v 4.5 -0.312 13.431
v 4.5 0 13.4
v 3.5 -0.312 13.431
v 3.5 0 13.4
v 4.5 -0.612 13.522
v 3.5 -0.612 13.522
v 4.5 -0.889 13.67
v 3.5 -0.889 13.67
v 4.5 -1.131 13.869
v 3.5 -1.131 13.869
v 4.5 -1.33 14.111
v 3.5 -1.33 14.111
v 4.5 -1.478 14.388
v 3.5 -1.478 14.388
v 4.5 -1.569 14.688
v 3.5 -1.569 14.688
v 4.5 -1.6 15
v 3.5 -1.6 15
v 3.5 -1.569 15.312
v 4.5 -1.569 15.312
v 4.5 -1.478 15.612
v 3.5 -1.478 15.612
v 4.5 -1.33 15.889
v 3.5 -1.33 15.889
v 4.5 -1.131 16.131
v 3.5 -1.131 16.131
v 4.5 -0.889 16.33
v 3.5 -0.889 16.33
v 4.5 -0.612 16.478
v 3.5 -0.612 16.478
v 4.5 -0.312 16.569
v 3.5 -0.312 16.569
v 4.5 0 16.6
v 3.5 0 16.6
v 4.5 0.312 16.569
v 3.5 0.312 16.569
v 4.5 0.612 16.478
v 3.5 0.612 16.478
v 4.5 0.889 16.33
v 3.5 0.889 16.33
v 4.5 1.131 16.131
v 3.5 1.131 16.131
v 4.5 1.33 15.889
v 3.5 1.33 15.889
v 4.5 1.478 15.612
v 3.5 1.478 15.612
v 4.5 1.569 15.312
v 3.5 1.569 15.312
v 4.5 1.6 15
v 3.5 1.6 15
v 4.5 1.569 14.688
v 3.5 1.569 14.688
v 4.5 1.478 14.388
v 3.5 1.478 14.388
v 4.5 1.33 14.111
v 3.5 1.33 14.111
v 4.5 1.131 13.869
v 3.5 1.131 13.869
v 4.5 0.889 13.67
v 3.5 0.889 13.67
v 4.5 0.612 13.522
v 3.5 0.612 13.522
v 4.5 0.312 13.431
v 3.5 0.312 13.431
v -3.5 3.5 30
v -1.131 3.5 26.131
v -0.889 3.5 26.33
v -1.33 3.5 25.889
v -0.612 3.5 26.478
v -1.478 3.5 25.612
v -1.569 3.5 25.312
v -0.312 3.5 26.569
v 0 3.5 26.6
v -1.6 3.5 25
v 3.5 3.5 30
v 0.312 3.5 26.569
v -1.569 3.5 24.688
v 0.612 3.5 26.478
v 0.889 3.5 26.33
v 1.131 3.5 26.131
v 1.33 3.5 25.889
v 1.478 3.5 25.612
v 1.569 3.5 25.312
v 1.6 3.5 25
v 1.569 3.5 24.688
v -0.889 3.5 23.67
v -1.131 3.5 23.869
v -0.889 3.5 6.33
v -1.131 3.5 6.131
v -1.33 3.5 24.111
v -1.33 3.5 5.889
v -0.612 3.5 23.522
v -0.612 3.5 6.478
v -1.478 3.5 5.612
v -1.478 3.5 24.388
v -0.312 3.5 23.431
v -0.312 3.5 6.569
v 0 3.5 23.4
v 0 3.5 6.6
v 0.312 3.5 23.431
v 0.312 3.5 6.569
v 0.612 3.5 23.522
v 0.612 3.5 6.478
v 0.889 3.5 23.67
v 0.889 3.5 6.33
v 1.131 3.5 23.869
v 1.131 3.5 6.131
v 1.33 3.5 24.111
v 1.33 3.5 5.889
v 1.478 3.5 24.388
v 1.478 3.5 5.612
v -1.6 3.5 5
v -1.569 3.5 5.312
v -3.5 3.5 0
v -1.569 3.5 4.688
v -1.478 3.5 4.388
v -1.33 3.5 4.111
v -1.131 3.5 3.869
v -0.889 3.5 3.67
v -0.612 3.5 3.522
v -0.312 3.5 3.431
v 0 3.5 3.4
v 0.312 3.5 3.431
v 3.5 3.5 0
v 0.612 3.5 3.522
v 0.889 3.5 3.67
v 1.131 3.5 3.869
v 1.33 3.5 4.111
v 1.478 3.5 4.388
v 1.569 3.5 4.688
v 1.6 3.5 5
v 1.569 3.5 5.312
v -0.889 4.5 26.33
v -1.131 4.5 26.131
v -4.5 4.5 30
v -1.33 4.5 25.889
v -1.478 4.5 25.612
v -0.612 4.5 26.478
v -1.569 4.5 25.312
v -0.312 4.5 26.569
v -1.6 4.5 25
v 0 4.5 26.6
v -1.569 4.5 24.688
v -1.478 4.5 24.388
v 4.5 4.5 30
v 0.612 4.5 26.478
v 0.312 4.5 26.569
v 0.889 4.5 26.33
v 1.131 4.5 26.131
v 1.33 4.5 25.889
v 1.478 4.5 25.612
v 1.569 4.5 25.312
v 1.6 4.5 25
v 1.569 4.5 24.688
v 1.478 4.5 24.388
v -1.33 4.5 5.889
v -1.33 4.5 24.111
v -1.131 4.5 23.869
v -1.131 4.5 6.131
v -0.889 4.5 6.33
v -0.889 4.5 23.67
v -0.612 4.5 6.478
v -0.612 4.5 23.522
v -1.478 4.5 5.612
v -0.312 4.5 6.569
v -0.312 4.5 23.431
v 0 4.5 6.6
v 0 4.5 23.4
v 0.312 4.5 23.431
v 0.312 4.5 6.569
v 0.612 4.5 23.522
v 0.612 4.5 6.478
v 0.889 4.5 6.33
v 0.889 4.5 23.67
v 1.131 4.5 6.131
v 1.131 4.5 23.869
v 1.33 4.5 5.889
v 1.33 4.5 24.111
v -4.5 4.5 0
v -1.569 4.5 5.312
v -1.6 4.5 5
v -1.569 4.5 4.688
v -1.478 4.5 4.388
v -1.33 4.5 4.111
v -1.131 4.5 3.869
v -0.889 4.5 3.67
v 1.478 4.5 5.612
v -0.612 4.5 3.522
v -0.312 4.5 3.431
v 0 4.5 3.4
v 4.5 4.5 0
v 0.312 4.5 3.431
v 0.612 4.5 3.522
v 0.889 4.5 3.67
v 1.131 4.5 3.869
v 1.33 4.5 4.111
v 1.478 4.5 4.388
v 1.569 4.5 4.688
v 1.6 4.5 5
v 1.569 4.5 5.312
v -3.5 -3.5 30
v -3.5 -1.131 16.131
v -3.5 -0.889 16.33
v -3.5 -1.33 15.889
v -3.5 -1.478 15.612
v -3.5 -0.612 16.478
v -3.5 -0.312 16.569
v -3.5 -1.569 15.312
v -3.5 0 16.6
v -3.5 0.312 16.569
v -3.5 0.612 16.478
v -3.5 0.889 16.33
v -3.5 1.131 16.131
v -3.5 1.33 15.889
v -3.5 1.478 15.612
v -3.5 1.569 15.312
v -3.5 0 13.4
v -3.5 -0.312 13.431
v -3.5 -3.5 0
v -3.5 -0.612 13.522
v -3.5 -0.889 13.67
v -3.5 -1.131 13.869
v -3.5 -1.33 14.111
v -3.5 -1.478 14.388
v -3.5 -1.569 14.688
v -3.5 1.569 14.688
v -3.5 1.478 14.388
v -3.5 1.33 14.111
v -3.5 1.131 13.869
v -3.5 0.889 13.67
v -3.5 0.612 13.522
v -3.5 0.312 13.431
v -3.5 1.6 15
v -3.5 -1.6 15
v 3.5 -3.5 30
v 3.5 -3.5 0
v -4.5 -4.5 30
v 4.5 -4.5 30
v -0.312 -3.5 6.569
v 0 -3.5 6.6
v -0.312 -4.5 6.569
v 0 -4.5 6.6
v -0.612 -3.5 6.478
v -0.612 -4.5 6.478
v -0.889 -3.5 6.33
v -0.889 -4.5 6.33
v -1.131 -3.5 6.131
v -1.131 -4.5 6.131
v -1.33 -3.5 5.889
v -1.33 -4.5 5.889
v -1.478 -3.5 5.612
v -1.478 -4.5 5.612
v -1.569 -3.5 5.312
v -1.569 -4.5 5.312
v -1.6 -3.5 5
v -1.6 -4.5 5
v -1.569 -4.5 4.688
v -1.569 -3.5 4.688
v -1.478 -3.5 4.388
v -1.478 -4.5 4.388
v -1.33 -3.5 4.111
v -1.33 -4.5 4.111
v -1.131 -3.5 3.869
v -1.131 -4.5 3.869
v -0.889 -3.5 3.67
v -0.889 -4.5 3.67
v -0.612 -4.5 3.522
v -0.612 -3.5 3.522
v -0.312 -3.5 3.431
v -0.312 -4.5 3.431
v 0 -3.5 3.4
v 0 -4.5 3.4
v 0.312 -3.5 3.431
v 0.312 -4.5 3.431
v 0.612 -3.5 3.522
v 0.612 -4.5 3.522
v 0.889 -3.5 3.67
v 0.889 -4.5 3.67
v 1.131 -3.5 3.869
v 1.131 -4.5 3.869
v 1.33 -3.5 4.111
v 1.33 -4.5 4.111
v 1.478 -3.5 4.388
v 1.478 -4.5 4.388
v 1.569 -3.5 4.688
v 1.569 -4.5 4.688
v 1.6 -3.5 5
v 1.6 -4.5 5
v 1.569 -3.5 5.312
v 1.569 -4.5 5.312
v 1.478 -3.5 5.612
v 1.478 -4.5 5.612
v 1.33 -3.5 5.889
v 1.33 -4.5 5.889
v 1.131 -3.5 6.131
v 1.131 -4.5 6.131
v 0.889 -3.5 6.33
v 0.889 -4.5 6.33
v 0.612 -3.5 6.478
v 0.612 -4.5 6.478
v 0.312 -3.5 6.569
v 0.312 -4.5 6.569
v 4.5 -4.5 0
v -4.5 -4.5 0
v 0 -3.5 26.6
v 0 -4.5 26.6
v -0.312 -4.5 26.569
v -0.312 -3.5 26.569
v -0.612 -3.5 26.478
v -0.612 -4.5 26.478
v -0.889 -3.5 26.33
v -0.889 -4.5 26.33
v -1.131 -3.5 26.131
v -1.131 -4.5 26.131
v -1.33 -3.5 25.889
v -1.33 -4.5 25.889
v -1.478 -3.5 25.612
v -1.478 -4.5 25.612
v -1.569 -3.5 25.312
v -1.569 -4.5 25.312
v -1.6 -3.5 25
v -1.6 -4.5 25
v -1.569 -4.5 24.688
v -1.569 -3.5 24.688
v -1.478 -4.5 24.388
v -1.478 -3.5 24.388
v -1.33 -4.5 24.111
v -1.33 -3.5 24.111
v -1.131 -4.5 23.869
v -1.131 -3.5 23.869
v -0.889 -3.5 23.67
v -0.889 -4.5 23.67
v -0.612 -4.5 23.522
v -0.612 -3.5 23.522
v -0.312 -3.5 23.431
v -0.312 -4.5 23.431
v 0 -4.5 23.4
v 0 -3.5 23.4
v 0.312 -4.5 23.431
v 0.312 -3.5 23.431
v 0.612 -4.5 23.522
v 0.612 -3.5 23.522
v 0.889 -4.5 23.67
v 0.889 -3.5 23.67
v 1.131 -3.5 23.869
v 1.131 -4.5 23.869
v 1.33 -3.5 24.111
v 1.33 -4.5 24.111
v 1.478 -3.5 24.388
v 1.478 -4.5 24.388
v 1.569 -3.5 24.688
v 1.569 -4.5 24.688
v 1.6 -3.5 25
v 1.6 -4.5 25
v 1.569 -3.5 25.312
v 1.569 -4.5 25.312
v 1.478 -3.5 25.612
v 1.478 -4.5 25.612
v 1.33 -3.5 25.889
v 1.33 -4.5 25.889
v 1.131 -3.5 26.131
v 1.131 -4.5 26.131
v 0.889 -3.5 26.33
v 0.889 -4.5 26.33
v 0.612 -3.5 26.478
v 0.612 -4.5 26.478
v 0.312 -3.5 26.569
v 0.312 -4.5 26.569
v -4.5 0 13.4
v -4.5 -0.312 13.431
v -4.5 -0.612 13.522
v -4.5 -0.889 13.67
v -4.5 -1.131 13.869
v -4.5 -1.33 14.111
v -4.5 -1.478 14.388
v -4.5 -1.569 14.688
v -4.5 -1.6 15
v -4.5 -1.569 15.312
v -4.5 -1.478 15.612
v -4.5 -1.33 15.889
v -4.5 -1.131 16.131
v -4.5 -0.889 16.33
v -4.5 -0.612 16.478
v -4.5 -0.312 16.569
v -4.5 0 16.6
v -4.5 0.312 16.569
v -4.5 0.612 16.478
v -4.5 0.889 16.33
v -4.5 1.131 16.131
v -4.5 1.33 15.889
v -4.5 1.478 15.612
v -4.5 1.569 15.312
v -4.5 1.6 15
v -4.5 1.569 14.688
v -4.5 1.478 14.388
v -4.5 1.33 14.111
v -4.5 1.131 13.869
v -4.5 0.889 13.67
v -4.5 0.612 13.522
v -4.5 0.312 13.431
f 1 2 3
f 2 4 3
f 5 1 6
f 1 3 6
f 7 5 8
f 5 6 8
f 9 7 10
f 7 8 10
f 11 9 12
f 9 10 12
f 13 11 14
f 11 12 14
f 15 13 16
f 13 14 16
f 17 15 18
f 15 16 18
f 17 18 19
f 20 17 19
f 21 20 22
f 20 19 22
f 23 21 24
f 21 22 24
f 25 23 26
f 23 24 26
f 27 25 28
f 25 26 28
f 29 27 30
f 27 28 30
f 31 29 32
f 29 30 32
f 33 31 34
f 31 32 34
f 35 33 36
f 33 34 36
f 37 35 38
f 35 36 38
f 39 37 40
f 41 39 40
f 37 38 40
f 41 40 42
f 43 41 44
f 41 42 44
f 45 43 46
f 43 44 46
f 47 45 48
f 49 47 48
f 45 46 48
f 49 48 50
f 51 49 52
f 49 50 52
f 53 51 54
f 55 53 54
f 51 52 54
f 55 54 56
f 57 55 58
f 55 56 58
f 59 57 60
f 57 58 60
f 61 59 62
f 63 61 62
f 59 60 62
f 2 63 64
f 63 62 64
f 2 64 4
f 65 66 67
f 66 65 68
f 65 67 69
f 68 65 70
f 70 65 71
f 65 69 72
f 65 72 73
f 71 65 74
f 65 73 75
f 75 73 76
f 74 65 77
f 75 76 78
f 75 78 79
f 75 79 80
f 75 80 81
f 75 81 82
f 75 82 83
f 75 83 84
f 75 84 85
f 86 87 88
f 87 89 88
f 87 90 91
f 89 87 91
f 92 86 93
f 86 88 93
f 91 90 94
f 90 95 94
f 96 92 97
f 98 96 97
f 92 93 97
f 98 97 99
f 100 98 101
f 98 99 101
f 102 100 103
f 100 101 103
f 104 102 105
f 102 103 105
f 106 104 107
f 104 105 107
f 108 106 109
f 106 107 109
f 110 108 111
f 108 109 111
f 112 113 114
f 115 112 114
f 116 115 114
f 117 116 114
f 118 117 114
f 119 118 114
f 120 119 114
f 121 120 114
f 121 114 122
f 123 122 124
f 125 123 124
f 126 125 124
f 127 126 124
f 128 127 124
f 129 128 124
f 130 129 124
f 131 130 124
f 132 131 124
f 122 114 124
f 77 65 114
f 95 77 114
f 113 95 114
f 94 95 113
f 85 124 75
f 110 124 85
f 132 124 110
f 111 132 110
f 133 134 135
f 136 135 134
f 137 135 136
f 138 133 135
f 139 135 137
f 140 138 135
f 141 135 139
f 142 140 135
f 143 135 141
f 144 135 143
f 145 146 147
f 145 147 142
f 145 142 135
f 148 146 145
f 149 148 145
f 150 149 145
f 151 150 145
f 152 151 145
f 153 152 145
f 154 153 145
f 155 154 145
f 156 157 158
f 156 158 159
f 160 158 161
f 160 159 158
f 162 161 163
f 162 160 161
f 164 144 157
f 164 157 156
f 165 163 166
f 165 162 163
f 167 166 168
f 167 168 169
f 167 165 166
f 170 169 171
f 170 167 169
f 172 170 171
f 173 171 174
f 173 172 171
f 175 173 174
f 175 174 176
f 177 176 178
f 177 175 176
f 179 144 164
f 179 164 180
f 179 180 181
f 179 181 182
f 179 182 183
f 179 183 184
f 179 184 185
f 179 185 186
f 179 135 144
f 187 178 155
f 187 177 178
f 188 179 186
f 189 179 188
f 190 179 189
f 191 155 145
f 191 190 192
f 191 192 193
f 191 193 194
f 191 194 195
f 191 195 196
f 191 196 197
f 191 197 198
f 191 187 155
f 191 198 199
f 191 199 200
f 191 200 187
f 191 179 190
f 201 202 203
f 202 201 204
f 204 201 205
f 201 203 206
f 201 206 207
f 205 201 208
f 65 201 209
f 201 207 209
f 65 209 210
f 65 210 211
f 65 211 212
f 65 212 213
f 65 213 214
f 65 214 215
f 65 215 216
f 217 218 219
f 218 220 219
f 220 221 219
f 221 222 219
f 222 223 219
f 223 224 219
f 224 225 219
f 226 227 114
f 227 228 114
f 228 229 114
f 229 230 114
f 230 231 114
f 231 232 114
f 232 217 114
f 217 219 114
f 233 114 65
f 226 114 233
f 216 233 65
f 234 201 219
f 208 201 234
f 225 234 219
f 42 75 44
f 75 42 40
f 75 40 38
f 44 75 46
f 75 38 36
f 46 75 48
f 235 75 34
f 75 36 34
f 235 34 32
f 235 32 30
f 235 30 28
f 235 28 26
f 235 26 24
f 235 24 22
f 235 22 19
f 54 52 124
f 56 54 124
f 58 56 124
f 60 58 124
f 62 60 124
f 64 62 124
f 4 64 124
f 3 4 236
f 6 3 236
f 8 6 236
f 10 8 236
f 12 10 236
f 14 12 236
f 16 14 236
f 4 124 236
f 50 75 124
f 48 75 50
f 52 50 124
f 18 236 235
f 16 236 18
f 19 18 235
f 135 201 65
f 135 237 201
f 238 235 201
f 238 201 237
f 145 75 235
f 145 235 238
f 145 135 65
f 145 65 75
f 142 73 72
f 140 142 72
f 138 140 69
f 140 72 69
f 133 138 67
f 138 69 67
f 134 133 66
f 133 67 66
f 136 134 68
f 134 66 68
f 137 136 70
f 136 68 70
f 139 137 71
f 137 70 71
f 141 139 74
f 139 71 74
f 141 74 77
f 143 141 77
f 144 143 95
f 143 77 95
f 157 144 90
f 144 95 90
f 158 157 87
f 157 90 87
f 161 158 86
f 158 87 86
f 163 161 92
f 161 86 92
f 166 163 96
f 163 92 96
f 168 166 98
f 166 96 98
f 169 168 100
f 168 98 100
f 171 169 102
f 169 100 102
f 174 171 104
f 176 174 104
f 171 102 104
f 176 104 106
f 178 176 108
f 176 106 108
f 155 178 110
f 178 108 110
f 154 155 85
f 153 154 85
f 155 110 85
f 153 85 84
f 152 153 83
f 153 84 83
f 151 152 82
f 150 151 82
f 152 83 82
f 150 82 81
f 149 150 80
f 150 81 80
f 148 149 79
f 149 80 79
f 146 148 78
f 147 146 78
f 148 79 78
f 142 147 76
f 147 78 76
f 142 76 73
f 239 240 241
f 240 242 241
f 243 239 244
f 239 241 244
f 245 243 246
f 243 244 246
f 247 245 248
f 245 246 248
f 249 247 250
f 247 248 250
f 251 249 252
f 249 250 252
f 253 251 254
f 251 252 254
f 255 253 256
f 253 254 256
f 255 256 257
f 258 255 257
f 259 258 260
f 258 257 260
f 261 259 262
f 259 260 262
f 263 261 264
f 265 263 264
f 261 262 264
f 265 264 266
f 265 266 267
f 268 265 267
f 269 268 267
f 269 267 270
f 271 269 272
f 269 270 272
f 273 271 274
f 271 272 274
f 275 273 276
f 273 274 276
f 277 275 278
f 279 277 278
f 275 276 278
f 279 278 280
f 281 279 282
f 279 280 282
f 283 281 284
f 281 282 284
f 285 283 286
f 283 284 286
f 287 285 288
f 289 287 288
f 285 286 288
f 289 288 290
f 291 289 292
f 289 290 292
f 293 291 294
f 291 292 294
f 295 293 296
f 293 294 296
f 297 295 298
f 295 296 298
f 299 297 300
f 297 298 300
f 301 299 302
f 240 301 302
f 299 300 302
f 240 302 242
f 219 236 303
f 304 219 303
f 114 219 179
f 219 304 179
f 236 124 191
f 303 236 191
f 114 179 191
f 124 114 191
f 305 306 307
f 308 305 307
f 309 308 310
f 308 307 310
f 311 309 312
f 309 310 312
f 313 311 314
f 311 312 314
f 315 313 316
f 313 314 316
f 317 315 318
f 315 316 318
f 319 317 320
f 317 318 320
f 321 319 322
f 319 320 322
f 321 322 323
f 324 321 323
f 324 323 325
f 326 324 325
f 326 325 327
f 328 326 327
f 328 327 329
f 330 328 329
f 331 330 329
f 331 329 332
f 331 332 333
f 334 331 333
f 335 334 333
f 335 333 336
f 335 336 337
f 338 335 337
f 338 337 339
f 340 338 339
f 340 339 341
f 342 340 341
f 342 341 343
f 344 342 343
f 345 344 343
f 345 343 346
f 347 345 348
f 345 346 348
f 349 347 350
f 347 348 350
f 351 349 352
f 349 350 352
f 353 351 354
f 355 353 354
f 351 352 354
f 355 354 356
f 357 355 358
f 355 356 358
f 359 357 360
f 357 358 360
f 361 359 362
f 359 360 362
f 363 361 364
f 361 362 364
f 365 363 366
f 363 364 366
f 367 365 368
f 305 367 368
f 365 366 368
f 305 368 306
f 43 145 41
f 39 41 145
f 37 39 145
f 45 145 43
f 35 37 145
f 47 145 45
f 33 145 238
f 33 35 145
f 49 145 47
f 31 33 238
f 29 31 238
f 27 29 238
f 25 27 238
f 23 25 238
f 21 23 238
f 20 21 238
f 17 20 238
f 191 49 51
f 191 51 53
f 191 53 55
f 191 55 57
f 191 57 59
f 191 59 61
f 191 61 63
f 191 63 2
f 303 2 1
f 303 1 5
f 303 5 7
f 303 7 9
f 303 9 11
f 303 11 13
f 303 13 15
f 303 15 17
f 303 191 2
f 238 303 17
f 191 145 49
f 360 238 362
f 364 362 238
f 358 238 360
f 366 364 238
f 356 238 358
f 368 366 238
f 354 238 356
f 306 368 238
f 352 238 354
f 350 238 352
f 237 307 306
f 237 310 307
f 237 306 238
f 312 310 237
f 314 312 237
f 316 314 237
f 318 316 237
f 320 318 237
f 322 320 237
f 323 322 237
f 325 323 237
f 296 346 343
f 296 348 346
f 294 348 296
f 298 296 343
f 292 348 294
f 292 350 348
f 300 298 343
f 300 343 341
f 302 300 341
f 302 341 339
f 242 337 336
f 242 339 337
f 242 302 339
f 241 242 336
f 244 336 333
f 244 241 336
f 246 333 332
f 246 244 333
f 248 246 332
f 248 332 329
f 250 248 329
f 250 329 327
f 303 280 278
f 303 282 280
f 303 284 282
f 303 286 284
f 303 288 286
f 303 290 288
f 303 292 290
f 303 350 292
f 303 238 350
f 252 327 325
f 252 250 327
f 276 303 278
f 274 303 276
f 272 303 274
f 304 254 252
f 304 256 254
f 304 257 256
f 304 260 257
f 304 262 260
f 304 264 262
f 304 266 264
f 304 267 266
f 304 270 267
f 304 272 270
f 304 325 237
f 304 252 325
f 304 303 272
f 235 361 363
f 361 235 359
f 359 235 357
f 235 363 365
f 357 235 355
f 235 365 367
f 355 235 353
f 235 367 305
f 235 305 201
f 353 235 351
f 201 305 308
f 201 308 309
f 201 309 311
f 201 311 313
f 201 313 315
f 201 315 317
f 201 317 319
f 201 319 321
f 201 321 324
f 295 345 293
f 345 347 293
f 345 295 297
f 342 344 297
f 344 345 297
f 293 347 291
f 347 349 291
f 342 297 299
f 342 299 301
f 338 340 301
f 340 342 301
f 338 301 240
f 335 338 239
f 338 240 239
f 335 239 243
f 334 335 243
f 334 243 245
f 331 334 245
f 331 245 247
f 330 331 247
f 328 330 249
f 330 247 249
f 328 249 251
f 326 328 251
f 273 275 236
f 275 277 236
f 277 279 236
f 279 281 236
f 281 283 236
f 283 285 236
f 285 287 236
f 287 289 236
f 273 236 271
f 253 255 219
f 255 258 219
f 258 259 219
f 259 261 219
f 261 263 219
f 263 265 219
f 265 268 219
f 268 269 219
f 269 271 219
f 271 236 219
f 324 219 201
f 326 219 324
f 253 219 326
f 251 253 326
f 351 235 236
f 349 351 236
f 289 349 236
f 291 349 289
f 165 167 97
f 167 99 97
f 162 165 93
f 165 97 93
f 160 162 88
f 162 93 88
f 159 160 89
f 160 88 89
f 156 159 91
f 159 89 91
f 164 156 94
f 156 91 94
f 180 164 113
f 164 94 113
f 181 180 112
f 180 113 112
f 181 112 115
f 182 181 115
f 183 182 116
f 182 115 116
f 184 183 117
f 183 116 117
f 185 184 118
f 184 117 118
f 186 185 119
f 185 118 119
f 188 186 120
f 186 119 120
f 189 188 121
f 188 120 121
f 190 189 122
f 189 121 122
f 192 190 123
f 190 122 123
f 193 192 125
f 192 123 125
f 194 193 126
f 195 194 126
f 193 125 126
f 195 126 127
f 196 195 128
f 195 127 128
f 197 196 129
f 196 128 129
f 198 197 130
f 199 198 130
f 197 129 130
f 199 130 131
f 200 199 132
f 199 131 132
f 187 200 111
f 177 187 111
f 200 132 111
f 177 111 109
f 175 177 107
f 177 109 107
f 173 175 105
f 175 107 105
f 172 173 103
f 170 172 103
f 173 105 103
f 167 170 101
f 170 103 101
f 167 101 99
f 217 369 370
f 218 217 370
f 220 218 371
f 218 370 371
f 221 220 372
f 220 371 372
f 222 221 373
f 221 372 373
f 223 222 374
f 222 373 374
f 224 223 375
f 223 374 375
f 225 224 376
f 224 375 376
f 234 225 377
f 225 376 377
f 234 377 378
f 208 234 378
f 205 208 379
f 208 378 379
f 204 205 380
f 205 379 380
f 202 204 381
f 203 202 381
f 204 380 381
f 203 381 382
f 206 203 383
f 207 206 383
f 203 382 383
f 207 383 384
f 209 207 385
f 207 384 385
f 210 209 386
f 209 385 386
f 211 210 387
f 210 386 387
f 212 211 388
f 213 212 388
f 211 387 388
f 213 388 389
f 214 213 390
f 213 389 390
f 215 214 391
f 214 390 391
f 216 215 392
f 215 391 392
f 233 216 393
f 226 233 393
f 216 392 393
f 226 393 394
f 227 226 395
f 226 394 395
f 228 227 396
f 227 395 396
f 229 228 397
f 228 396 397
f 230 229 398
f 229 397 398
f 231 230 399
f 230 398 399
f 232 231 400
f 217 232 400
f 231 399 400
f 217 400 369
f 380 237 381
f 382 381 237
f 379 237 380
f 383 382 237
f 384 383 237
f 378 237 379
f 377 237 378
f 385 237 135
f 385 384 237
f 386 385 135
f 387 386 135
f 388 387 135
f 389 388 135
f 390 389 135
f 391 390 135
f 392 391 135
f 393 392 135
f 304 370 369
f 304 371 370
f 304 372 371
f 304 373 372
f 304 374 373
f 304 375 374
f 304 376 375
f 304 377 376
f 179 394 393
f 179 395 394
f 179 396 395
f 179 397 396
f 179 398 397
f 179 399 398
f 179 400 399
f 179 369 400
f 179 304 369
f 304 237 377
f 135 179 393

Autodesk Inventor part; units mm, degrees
ref_plane "YZ Plane" through (0, 0, 0) normal (1, 0, 0) x (0, 1, 0)
ref_plane "XZ Plane" through (0, 0, 0) normal (0, 1, 0) x (-1, 0, 0)
ref_plane "XY Plane" through (0, 0, 0) normal (0, 0, 1) x (1, 0, 0)
sketch "スケッチ1" plane through (0, 0, 0) normal (0, 0, 1) x (1, 0, 0)
  line L0 (4.5, -4.5) -> (-4.5, -4.5)
  line L1 (-4.5, -4.5) -> (-4.5, 4.5)
  line L2 (-4.5, 4.5) -> (4.5, 4.5)
  line L3 (4.5, 4.5) -> (4.5, -4.5)
  line L4 (4.5, -4.5) -> (-4.5, 4.5) construction
  line L5 (-4.5, -4.5) -> (4.5, 4.5) construction
  point P0 (0, 0)
  dimension "d0" = 9
  dimension "d1" = 9
extrude "押し出し1" add sketch "スケッチ1" along normal blind 30
shell "シェル1" thickness 1 removed faces 2 at (1.5, -1.5, 0) at (1.5, -1.5, 30)
sketch "スケッチ2" plane through (-4.5, 4.5, 0) normal (0, 1, 0) x (1, 0, 0)
  line L0 (0, 0) -> (9, 0) projected
  point P0 (4.5, 0)
  point P1 (4.5, -5)
  point P2 (4.5, -25)
  point P3 (4.5, 0)
  dimension "d5" = 20
  dimension "d6" = 5
hole "穴1" at (0, 4.5, 5) at (0, 4.5, 25) direction (0, -1, 0) diameter 3.2 end through all
sketch "スケッチ3" plane through (4.5, -4.5, 0) normal (1, 0, 0) x (0, 0, -1)
  line L0 (0, 9) -> (0, 0) projected
  line L1 (0, 9) -> (-30, 9) projected
  line L2 (-30, 0) -> (-30, 9) projected
  line L3 (0, 0) -> (-30, 0) projected
  point P0 (0, 4.5)
  point P1 (-15, 4.5)
  point P2 (-15, 9)
  point P3 (0, 4.5)
hole "穴2" at (4.5, 0, 15) direction (-1, 0, 0) diameter 3.2 end through all
properties part number "SqPipeminin"
